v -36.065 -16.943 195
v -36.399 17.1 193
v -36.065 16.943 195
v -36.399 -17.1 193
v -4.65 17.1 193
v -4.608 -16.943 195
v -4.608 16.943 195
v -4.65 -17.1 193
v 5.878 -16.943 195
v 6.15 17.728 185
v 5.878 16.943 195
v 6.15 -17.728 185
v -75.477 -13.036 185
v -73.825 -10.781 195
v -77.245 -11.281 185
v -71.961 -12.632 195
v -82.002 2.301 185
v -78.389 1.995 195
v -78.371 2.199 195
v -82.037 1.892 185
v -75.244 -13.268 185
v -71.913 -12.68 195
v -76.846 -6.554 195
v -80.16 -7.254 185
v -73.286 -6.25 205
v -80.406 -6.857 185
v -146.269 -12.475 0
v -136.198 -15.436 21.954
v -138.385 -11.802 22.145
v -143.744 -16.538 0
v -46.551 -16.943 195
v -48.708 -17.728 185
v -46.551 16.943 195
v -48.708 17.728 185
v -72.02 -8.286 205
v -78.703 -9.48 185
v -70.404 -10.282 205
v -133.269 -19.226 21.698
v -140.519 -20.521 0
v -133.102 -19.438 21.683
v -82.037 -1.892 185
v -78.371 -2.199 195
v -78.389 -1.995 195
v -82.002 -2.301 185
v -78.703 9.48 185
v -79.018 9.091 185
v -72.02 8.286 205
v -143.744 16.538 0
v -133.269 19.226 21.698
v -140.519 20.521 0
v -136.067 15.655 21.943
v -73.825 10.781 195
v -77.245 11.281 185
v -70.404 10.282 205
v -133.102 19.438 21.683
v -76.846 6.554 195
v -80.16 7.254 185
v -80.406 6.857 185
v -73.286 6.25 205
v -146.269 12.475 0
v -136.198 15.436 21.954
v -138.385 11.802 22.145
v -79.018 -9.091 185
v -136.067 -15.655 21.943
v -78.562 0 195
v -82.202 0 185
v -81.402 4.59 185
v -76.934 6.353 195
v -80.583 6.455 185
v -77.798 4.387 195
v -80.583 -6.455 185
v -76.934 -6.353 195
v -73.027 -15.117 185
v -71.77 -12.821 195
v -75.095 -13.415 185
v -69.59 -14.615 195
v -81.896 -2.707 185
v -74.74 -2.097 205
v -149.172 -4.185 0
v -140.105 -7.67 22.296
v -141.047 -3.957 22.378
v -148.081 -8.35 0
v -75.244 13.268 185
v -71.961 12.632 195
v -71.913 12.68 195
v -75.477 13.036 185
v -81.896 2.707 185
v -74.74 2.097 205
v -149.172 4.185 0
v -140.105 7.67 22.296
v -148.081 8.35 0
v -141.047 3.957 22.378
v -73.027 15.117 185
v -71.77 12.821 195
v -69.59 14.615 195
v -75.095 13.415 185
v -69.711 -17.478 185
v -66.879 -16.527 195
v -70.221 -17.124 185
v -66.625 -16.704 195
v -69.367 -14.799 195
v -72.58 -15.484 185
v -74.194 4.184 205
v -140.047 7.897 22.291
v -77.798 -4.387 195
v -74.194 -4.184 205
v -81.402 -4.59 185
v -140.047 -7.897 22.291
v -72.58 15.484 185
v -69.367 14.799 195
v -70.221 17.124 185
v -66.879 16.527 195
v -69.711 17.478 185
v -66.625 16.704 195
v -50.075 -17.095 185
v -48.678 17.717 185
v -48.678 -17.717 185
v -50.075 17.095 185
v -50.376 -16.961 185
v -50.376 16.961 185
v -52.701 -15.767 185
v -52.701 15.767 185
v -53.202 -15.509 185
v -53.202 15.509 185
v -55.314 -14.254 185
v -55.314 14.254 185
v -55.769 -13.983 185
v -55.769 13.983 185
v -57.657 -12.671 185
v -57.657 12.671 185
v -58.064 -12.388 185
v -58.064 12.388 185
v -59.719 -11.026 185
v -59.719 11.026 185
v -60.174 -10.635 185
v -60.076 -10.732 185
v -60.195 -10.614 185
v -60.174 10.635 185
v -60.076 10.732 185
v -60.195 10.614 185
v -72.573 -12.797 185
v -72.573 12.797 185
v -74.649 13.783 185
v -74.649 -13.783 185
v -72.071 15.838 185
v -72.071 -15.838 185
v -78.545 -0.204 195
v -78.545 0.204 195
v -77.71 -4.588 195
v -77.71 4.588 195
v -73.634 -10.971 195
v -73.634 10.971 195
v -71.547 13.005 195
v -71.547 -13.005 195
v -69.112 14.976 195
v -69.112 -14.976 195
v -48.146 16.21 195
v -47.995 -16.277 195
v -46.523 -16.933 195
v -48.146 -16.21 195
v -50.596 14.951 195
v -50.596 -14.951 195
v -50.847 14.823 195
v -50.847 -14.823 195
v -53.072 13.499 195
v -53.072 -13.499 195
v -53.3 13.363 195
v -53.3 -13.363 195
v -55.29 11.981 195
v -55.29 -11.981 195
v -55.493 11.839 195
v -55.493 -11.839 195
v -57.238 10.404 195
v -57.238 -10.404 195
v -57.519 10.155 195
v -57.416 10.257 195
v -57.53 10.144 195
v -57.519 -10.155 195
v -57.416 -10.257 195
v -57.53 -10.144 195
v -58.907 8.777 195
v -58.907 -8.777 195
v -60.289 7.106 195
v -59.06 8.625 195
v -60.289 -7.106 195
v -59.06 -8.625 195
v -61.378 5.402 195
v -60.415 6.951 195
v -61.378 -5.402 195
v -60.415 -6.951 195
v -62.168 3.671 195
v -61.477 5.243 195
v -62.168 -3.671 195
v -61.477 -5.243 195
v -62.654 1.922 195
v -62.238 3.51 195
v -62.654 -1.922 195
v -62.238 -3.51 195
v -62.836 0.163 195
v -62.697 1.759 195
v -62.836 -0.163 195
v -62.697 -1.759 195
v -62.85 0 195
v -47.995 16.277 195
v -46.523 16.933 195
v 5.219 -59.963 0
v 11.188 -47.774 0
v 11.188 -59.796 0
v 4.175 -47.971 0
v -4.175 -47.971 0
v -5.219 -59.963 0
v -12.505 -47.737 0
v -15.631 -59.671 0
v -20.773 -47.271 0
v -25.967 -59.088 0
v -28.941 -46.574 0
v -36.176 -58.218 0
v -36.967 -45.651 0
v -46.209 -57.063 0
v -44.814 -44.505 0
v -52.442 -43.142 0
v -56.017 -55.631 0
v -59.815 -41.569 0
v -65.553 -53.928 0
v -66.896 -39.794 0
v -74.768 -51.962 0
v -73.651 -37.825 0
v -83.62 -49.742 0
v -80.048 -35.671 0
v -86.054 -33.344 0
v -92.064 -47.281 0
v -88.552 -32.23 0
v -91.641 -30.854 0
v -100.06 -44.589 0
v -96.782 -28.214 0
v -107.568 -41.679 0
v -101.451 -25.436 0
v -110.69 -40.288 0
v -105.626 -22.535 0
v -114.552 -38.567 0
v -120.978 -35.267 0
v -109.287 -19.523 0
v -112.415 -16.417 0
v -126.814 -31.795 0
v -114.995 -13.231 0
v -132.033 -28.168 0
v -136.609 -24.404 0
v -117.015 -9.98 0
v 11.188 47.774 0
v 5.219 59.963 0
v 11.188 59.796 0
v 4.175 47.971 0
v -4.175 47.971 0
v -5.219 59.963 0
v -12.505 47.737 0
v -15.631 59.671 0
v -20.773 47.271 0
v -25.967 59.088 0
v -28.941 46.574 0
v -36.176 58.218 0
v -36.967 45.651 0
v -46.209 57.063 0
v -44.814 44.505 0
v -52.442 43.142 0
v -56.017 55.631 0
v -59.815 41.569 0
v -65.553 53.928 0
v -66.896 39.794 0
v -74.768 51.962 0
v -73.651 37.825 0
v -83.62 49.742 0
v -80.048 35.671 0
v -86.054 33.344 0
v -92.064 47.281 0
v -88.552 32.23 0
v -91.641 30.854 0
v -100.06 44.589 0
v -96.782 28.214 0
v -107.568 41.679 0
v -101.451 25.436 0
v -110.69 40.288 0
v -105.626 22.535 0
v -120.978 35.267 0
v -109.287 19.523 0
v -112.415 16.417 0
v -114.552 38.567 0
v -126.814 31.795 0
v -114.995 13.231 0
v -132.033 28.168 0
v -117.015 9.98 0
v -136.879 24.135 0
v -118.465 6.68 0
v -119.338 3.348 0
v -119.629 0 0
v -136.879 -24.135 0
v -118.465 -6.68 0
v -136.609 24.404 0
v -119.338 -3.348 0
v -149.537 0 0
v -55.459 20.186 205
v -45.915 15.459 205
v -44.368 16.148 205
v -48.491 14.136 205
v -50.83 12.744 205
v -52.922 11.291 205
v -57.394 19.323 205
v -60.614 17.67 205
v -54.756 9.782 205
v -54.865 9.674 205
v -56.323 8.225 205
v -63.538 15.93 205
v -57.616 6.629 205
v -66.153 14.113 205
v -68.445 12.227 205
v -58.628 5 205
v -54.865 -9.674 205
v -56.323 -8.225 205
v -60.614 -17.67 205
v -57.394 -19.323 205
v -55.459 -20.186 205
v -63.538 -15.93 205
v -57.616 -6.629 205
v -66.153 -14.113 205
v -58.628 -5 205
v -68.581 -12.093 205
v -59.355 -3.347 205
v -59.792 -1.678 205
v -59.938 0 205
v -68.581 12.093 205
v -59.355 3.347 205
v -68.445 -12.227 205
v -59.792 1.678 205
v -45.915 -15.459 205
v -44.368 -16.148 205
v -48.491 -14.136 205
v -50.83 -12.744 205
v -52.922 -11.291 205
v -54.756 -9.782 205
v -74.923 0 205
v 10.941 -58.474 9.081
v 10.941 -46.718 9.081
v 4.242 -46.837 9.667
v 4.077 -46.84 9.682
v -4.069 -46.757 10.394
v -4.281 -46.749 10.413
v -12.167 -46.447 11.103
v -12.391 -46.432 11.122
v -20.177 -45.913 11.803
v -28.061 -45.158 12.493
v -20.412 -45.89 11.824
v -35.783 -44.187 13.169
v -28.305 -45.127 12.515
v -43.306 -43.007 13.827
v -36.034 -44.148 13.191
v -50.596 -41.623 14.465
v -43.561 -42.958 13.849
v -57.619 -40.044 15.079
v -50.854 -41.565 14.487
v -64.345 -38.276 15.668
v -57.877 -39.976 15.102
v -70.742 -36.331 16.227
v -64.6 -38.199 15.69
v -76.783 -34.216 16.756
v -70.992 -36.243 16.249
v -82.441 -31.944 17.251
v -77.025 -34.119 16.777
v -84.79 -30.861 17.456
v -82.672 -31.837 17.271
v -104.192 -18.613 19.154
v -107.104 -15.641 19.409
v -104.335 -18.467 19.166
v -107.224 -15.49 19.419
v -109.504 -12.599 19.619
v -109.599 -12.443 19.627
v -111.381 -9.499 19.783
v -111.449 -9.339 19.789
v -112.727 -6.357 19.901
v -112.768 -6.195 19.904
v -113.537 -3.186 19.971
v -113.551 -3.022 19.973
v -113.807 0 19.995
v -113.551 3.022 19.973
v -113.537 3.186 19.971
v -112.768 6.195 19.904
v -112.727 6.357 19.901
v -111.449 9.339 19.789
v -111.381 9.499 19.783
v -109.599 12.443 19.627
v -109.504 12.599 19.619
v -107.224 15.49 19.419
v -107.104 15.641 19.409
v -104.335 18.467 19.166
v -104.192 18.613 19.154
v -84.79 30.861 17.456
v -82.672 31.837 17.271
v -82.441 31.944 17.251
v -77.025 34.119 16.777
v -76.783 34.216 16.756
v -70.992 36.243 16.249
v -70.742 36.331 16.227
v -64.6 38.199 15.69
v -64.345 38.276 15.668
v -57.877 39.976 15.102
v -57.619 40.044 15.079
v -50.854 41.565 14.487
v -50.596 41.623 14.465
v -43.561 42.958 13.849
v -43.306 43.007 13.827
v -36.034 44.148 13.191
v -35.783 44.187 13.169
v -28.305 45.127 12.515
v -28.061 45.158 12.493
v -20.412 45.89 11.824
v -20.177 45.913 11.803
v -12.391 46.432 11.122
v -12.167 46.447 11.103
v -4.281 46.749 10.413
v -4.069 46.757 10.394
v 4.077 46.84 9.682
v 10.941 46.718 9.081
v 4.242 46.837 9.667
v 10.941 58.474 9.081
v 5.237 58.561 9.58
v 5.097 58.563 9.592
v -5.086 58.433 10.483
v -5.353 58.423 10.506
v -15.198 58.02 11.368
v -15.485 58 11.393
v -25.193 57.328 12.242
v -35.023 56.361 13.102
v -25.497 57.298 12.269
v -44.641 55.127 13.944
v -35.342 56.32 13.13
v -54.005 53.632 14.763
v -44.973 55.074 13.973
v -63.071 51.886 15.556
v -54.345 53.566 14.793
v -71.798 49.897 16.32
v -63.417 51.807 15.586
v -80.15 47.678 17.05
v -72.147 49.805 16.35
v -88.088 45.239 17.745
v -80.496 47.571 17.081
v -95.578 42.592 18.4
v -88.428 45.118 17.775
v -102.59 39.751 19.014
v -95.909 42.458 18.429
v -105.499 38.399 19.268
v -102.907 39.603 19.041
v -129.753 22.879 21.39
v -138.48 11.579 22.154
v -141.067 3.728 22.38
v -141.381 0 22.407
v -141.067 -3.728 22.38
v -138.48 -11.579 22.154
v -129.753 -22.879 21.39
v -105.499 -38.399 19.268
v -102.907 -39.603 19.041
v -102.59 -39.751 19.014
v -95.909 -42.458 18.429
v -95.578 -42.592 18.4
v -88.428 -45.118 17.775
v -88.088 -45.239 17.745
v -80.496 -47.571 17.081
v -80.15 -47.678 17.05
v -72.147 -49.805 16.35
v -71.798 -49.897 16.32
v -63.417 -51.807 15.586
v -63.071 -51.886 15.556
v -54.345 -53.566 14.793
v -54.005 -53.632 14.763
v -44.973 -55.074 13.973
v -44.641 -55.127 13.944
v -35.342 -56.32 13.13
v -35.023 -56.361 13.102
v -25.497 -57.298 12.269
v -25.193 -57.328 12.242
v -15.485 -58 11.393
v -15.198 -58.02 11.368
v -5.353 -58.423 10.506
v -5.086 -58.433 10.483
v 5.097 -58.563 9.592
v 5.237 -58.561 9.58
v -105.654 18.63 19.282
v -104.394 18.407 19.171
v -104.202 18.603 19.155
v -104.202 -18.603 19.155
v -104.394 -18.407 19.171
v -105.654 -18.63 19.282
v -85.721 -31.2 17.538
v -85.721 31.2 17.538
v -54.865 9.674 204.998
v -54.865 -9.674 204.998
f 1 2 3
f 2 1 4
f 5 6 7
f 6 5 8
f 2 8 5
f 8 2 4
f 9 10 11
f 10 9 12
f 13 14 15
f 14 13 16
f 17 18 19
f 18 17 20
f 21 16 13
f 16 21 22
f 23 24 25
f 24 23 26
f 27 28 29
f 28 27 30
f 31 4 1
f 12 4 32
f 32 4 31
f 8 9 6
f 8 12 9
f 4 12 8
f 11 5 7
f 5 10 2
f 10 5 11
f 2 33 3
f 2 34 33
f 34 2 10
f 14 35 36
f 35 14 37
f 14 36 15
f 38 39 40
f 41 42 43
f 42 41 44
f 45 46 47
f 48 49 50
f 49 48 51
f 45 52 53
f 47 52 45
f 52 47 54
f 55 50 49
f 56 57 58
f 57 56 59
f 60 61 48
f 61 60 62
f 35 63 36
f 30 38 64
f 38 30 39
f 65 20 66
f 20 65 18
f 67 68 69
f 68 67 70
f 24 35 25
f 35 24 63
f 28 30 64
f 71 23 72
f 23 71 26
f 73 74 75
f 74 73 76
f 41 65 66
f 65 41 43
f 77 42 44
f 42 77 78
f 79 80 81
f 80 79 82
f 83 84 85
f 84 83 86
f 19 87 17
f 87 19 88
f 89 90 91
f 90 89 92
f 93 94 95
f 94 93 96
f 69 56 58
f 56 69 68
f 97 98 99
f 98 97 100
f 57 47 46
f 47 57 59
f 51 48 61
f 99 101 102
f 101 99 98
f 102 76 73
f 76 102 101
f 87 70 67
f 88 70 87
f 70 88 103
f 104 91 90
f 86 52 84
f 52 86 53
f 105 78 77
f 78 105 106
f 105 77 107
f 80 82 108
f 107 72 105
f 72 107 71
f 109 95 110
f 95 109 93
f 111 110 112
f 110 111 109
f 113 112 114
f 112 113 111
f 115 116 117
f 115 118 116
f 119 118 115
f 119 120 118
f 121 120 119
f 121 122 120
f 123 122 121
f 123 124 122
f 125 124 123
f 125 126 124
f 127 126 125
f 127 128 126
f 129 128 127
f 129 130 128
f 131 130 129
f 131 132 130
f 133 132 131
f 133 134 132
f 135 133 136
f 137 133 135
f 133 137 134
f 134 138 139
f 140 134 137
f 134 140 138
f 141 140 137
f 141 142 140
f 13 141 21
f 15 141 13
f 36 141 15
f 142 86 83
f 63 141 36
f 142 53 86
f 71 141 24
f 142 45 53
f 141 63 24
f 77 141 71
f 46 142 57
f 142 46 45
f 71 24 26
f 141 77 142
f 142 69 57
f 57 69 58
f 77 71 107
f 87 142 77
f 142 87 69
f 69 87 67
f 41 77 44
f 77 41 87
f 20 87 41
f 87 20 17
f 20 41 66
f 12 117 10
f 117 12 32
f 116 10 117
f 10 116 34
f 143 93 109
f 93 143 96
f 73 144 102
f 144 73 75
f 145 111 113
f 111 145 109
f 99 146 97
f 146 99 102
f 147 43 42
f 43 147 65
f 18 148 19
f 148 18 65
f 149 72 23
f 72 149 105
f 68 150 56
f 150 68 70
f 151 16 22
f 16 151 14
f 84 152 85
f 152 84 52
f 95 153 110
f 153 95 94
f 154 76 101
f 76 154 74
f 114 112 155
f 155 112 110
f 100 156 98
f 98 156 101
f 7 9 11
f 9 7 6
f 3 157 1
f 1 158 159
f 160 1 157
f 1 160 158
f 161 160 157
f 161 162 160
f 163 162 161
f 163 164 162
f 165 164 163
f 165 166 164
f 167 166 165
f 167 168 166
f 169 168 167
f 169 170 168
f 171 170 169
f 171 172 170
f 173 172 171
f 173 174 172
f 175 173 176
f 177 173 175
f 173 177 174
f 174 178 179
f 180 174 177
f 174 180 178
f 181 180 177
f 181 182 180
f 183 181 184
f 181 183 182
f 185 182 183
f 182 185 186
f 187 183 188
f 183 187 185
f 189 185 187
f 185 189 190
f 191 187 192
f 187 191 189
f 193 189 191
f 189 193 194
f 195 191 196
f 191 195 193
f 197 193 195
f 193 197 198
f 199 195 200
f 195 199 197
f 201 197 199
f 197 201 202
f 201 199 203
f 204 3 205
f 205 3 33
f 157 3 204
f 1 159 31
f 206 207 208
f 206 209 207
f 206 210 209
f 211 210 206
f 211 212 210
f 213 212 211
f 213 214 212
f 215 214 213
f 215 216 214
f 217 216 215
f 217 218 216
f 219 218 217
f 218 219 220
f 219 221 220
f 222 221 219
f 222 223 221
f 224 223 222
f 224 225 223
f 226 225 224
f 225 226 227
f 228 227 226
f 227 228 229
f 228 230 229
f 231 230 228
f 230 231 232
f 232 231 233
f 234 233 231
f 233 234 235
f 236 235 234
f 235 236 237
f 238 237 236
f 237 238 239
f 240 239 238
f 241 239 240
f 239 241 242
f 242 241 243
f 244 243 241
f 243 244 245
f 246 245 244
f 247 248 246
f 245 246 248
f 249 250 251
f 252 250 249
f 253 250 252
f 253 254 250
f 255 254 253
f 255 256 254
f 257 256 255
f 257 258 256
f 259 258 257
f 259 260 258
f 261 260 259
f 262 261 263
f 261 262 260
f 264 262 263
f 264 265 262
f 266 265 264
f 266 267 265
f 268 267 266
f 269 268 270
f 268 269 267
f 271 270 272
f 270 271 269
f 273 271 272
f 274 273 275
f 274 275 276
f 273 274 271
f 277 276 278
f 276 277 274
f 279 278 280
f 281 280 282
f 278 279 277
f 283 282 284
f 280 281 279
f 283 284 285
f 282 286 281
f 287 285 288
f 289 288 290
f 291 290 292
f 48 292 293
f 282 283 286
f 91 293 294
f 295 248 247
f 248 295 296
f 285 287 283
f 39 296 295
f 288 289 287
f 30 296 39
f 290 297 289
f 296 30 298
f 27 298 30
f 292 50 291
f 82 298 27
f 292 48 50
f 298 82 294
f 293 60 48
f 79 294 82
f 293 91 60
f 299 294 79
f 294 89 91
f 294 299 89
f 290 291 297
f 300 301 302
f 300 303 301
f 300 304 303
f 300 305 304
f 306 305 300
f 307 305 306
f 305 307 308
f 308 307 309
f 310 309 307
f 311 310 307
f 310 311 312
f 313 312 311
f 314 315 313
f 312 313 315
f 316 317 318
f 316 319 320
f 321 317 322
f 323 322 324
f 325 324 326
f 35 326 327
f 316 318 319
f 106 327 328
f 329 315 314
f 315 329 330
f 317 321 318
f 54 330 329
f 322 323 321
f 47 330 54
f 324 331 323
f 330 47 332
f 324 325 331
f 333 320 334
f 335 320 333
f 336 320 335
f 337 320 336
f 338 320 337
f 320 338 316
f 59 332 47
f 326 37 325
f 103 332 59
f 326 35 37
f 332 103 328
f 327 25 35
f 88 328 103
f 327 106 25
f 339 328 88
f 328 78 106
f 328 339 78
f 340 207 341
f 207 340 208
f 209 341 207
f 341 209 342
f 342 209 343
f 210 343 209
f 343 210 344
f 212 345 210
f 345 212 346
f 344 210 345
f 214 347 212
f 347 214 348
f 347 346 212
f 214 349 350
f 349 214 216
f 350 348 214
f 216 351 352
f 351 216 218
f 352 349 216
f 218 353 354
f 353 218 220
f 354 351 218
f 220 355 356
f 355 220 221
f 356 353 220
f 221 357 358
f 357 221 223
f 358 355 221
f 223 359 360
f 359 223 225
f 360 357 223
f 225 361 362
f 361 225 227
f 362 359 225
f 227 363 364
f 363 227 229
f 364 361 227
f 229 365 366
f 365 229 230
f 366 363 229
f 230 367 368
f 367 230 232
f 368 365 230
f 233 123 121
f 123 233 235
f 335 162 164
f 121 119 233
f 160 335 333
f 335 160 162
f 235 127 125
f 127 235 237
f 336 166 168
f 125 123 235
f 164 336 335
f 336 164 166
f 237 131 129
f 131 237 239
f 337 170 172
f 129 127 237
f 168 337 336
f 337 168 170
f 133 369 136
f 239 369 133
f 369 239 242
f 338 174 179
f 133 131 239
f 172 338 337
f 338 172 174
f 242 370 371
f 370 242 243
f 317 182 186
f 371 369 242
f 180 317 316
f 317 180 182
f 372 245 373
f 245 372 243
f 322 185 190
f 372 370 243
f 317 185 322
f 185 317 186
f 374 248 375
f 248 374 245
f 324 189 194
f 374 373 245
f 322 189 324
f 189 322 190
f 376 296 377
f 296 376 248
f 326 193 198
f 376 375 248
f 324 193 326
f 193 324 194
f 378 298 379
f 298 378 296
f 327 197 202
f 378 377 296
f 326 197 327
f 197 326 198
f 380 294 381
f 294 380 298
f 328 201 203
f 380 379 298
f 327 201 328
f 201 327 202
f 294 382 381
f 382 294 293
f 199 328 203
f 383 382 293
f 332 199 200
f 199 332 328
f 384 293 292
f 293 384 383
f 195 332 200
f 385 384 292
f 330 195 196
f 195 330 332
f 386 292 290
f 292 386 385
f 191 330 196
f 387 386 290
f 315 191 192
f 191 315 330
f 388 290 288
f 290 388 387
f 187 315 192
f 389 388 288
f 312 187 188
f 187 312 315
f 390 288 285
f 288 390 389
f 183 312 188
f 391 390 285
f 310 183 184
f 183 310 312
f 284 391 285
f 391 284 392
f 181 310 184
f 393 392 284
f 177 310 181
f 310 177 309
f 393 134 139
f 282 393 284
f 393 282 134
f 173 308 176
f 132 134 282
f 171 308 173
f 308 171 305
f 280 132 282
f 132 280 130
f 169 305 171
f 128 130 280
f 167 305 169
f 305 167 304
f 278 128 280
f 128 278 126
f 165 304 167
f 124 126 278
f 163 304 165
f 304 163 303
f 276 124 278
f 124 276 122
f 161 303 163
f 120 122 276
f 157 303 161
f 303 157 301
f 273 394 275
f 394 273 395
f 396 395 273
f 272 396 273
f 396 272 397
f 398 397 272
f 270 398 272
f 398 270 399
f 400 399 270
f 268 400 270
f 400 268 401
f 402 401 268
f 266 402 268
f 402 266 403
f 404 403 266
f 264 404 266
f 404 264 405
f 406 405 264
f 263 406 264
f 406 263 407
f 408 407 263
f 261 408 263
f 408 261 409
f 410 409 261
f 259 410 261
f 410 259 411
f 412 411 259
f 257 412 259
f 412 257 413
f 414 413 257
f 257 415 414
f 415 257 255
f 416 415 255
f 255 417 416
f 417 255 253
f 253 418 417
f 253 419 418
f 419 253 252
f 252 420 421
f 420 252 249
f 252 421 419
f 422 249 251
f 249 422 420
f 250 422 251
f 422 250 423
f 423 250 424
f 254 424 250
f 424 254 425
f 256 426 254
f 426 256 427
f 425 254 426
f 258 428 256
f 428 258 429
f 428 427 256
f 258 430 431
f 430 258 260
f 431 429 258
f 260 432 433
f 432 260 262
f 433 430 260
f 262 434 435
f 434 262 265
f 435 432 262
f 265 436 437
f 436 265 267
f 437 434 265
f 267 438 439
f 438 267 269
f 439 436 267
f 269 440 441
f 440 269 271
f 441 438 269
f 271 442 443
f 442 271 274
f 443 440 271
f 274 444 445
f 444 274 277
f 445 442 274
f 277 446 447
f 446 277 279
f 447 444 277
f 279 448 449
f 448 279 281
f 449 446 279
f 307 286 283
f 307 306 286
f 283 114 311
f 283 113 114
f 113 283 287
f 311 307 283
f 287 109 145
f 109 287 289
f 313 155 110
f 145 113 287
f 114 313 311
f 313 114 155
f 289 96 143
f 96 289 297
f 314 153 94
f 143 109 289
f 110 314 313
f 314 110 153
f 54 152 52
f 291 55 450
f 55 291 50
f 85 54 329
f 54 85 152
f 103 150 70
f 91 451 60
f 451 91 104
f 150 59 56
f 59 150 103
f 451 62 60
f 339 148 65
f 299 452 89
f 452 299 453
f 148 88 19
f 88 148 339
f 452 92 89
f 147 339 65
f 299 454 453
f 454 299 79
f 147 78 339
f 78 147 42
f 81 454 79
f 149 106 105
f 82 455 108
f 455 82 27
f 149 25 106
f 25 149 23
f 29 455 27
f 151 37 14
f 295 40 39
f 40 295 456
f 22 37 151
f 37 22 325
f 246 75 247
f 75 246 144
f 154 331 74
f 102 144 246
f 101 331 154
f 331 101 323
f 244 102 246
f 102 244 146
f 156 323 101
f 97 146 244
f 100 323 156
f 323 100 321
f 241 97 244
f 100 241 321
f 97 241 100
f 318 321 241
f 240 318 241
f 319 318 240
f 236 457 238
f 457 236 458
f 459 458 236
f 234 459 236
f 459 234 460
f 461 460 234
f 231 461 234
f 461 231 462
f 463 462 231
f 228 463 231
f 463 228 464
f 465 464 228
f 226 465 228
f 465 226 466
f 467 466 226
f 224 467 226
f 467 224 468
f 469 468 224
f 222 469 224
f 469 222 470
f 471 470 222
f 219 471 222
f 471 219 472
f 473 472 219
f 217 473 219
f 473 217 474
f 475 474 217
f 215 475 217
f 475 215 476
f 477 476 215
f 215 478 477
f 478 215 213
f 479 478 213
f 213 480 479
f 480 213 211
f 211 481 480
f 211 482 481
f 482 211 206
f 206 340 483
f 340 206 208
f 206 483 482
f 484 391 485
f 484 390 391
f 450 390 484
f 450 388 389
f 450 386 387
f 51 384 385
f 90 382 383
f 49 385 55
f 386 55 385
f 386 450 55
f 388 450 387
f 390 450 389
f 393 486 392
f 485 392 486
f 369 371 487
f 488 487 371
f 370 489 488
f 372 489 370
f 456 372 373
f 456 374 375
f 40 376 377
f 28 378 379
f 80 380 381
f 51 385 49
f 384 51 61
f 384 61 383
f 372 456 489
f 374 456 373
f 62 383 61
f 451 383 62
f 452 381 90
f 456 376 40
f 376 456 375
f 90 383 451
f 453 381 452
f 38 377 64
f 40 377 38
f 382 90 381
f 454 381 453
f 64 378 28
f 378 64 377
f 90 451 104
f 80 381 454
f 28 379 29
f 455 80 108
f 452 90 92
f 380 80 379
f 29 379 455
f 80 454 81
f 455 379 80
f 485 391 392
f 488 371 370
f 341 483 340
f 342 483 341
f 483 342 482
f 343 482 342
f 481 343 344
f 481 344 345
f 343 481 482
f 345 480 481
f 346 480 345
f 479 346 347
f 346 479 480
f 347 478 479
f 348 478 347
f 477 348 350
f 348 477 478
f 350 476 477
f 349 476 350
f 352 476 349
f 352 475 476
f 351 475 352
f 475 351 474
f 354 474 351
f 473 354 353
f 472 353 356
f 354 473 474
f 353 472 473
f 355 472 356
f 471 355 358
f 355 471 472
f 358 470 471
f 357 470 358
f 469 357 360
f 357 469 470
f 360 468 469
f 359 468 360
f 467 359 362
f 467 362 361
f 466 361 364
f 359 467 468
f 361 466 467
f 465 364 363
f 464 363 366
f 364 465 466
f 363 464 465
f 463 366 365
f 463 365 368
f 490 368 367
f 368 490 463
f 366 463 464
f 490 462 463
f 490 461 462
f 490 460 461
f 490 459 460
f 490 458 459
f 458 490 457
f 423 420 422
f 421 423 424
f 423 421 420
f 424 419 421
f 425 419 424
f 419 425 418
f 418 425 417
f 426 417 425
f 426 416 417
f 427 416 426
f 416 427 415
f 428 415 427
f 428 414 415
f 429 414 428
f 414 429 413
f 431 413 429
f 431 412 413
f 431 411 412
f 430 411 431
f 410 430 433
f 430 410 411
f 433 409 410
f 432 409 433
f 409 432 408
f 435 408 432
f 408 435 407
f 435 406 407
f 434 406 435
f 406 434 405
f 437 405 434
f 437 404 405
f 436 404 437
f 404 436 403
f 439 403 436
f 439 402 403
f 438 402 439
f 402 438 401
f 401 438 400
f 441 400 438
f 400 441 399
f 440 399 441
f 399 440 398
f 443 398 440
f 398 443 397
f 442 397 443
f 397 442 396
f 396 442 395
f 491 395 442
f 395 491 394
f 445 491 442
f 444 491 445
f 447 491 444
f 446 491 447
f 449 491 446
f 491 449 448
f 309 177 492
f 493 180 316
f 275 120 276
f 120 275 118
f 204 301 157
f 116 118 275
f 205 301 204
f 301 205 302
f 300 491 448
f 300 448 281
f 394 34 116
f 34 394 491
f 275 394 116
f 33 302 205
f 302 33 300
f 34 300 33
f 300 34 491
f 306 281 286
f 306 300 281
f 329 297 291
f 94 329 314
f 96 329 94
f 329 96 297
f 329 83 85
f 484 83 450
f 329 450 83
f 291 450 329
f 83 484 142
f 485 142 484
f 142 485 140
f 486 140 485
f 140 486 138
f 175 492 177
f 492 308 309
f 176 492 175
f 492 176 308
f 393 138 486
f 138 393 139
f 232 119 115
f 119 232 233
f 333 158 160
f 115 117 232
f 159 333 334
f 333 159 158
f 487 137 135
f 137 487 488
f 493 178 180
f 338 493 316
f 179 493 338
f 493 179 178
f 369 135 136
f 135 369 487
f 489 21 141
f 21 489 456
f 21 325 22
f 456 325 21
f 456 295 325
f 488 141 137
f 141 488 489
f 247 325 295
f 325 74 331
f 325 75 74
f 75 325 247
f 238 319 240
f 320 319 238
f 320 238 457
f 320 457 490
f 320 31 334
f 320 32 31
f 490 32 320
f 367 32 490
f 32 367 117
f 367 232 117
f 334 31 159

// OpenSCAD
////////////////////////////////////////////////////////////////////////////////
// Head Phone Stand
////////////////////////////////////////////////////////////////////////////////
//
// (c) Andreas Mueller
// License: Creative Commans - Attribution
// http://creativecommons.org/licenses/by/4.0/
//
////////////////////////////////////////////////////////////////////////////////

// Height (mm)
height = 205 ; // [150:250]
// Length (mm)
length =  50 ; // [ 40: 80]
// Angle (°)
angle  =  70 ; // [ 60: 90]
// Print in two parts
split = 0 ;    // [0:no, 1:yes]

// calculating round edges takes very long time
roundEdge = 0+0 ; // [0:no, 1:yes]

/* [Hidden] */

////////////////////////////////////////////////////////////////////////////////

module headPhoneStand(height=185, lengthTop=50, angle=70, split=0, roundEdge=0)
{
  $fn = 90 ;
  length0 = height / tan(angle) ;
  lengthBottom = (lengthTop+length0) * 1.2 ;

  extrudeScale = (lengthBottom-length0) / lengthBottom ;
  widthBottom = 120 ;

  a = lengthBottom * 0.8 ;
  b = widthBottom / 2 * 0.8 ;
  t = tan(20) ;
  x = (a*b) / sqrt(b*b + a*a * t*t) ;
  y = (b/a) * sqrt(a*a - x*x) ;

  l = x - lengthTop/extrudeScale ;

  ////////////////////////////////////////
  
  module platform()
  {
    difference()
    {
      linear_extrude(height=height, scale=extrudeScale)
        difference()
      {
        scale([2*lengthBottom, widthBottom]) circle(d=1, $fa=12, $fs=2) ;
      
        translate([0,  widthBottom+y]) square([lengthBottom*2, widthBottom*2], center=true) ;
        translate([0, -widthBottom-y]) square([lengthBottom*2, widthBottom*2], center=true) ;
        translate([ lengthBottom-l,0]) square([lengthBottom*2, widthBottom*2], center=true) ;
      }

      translate ([0, 0, height/2 - 20]) cube([4*lengthBottom, 4*widthBottom, height], center=true) ;
      translate ([0, 0, 1.5*height   - 10]) cube([4*lengthBottom, 4*widthBottom, height], center=true) ;

      difference()
      {
        lx = (lengthTop-20)/extrudeScale ;
        linear_extrude(height=height, scale=extrudeScale)
        translate([-x+lx/2+10/extrudeScale,0])
        square([lx, widthBottom], center=true) ;

        translate([0,0,height/2-12])
        cube([4*lengthBottom, 4*widthBottom, height], center=true) ;
      }
    }
  }

  ////////////////////////////////////////
  
  module base()
  {
    module baseShape(length, width)
    {
      difference()
      {
        scale([2*length, width]) circle(d=1, $fa=12, $fs=2) ;
        scale([2*length*0.8, width*0.8]) circle(d=1, $fa=12, $fs=2) ;
        translate([length-l,0]) square([length*2, width*2], center=true) ;
      }
    }

    difference()
    {
      linear_extrude(height=height, scale=extrudeScale)
        baseShape(lengthBottom, widthBottom) ;

      translate([0,0,height*0.75-20])
        cube([5*lengthBottom, 5*lengthBottom, height/2], center=true) ;
      rotate([0,5,0])
        translate([0,0,height*0.25+10])
        cube([5*lengthBottom, 5*lengthBottom, height/2], center=true) ;
    
      rotate([0,0,80])
        translate([0,-lengthBottom,20])
        cube([5*lengthBottom, 5*lengthBottom,height]) ;
      rotate([0,0,190])
        translate([-lengthBottom,0,20])
        cube([5*lengthBottom, 5*lengthBottom,height]) ;
    }

    linear_extrude(height=height, scale=extrudeScale)
      difference()
    {
      baseShape(lengthBottom, widthBottom) ;
      rotate(  70) translate([0,-2.5*lengthBottom]) square(5*lengthBottom) ;
      rotate(-100) translate([0,-2.5*lengthBottom]) square(5*lengthBottom) ;
    }

    linear_extrude(height=height, scale=extrudeScale)
      difference()
    {
      baseShape(lengthBottom, widthBottom) ;
      rotate(-70) translate([0,-2.5*lengthBottom]) square(5*lengthBottom) ;
      rotate(100) translate([0,-2.5*lengthBottom]) square(5*lengthBottom) ;
    }
  }

  ////////////////////////////////////////
  
  module roundEdge()
  {
    if (roundEdge > 0)
    {
      difference()
      {
        minkowski()
        {
          sphere(d=4, $fn = 20) ;
          union()
          {
            children() ;
          }
        }

        translate([0,0,-500]) cube([1000,1000,1000], center=true) ;
      }
    }
    else
    {
      children() ;      
    }
  }

  ////////////////////////////////////////
  
  module split()
  {
    splitHeight = (roundEdge>0) ? height - 22 : height - 20 ;
    echo(splitHeight=splitHeight) ;

    if (split > 0)
    {
      difference()
      {
        union() children() ;
        translate([0, 0, 1.5*splitHeight]) cube([4*lengthBottom, 4*widthBottom, splitHeight], center=true) ;
      }

      translate([length/2, 0, -splitHeight])
      difference()
      {
        union() children() ;
        translate([0, 0, 0.5*splitHeight]) cube([4*lengthBottom, 4*widthBottom, splitHeight], center=true) ;
      }

    }
    else
    {
      children() ;
    }
  }

  ////////////////////////////////////////
  
  split()
  {
    roundEdge()
    {
      platform() ;
      base() ;
    }
  }
}

////////////////////////////////////////////////////////////////////////////////

headPhoneStand(height, length, angle, split, roundEdge) ;

////////////////////////////////////////////////////////////////////////////////
// EOF
////////////////////////////////////////////////////////////////////////////////
